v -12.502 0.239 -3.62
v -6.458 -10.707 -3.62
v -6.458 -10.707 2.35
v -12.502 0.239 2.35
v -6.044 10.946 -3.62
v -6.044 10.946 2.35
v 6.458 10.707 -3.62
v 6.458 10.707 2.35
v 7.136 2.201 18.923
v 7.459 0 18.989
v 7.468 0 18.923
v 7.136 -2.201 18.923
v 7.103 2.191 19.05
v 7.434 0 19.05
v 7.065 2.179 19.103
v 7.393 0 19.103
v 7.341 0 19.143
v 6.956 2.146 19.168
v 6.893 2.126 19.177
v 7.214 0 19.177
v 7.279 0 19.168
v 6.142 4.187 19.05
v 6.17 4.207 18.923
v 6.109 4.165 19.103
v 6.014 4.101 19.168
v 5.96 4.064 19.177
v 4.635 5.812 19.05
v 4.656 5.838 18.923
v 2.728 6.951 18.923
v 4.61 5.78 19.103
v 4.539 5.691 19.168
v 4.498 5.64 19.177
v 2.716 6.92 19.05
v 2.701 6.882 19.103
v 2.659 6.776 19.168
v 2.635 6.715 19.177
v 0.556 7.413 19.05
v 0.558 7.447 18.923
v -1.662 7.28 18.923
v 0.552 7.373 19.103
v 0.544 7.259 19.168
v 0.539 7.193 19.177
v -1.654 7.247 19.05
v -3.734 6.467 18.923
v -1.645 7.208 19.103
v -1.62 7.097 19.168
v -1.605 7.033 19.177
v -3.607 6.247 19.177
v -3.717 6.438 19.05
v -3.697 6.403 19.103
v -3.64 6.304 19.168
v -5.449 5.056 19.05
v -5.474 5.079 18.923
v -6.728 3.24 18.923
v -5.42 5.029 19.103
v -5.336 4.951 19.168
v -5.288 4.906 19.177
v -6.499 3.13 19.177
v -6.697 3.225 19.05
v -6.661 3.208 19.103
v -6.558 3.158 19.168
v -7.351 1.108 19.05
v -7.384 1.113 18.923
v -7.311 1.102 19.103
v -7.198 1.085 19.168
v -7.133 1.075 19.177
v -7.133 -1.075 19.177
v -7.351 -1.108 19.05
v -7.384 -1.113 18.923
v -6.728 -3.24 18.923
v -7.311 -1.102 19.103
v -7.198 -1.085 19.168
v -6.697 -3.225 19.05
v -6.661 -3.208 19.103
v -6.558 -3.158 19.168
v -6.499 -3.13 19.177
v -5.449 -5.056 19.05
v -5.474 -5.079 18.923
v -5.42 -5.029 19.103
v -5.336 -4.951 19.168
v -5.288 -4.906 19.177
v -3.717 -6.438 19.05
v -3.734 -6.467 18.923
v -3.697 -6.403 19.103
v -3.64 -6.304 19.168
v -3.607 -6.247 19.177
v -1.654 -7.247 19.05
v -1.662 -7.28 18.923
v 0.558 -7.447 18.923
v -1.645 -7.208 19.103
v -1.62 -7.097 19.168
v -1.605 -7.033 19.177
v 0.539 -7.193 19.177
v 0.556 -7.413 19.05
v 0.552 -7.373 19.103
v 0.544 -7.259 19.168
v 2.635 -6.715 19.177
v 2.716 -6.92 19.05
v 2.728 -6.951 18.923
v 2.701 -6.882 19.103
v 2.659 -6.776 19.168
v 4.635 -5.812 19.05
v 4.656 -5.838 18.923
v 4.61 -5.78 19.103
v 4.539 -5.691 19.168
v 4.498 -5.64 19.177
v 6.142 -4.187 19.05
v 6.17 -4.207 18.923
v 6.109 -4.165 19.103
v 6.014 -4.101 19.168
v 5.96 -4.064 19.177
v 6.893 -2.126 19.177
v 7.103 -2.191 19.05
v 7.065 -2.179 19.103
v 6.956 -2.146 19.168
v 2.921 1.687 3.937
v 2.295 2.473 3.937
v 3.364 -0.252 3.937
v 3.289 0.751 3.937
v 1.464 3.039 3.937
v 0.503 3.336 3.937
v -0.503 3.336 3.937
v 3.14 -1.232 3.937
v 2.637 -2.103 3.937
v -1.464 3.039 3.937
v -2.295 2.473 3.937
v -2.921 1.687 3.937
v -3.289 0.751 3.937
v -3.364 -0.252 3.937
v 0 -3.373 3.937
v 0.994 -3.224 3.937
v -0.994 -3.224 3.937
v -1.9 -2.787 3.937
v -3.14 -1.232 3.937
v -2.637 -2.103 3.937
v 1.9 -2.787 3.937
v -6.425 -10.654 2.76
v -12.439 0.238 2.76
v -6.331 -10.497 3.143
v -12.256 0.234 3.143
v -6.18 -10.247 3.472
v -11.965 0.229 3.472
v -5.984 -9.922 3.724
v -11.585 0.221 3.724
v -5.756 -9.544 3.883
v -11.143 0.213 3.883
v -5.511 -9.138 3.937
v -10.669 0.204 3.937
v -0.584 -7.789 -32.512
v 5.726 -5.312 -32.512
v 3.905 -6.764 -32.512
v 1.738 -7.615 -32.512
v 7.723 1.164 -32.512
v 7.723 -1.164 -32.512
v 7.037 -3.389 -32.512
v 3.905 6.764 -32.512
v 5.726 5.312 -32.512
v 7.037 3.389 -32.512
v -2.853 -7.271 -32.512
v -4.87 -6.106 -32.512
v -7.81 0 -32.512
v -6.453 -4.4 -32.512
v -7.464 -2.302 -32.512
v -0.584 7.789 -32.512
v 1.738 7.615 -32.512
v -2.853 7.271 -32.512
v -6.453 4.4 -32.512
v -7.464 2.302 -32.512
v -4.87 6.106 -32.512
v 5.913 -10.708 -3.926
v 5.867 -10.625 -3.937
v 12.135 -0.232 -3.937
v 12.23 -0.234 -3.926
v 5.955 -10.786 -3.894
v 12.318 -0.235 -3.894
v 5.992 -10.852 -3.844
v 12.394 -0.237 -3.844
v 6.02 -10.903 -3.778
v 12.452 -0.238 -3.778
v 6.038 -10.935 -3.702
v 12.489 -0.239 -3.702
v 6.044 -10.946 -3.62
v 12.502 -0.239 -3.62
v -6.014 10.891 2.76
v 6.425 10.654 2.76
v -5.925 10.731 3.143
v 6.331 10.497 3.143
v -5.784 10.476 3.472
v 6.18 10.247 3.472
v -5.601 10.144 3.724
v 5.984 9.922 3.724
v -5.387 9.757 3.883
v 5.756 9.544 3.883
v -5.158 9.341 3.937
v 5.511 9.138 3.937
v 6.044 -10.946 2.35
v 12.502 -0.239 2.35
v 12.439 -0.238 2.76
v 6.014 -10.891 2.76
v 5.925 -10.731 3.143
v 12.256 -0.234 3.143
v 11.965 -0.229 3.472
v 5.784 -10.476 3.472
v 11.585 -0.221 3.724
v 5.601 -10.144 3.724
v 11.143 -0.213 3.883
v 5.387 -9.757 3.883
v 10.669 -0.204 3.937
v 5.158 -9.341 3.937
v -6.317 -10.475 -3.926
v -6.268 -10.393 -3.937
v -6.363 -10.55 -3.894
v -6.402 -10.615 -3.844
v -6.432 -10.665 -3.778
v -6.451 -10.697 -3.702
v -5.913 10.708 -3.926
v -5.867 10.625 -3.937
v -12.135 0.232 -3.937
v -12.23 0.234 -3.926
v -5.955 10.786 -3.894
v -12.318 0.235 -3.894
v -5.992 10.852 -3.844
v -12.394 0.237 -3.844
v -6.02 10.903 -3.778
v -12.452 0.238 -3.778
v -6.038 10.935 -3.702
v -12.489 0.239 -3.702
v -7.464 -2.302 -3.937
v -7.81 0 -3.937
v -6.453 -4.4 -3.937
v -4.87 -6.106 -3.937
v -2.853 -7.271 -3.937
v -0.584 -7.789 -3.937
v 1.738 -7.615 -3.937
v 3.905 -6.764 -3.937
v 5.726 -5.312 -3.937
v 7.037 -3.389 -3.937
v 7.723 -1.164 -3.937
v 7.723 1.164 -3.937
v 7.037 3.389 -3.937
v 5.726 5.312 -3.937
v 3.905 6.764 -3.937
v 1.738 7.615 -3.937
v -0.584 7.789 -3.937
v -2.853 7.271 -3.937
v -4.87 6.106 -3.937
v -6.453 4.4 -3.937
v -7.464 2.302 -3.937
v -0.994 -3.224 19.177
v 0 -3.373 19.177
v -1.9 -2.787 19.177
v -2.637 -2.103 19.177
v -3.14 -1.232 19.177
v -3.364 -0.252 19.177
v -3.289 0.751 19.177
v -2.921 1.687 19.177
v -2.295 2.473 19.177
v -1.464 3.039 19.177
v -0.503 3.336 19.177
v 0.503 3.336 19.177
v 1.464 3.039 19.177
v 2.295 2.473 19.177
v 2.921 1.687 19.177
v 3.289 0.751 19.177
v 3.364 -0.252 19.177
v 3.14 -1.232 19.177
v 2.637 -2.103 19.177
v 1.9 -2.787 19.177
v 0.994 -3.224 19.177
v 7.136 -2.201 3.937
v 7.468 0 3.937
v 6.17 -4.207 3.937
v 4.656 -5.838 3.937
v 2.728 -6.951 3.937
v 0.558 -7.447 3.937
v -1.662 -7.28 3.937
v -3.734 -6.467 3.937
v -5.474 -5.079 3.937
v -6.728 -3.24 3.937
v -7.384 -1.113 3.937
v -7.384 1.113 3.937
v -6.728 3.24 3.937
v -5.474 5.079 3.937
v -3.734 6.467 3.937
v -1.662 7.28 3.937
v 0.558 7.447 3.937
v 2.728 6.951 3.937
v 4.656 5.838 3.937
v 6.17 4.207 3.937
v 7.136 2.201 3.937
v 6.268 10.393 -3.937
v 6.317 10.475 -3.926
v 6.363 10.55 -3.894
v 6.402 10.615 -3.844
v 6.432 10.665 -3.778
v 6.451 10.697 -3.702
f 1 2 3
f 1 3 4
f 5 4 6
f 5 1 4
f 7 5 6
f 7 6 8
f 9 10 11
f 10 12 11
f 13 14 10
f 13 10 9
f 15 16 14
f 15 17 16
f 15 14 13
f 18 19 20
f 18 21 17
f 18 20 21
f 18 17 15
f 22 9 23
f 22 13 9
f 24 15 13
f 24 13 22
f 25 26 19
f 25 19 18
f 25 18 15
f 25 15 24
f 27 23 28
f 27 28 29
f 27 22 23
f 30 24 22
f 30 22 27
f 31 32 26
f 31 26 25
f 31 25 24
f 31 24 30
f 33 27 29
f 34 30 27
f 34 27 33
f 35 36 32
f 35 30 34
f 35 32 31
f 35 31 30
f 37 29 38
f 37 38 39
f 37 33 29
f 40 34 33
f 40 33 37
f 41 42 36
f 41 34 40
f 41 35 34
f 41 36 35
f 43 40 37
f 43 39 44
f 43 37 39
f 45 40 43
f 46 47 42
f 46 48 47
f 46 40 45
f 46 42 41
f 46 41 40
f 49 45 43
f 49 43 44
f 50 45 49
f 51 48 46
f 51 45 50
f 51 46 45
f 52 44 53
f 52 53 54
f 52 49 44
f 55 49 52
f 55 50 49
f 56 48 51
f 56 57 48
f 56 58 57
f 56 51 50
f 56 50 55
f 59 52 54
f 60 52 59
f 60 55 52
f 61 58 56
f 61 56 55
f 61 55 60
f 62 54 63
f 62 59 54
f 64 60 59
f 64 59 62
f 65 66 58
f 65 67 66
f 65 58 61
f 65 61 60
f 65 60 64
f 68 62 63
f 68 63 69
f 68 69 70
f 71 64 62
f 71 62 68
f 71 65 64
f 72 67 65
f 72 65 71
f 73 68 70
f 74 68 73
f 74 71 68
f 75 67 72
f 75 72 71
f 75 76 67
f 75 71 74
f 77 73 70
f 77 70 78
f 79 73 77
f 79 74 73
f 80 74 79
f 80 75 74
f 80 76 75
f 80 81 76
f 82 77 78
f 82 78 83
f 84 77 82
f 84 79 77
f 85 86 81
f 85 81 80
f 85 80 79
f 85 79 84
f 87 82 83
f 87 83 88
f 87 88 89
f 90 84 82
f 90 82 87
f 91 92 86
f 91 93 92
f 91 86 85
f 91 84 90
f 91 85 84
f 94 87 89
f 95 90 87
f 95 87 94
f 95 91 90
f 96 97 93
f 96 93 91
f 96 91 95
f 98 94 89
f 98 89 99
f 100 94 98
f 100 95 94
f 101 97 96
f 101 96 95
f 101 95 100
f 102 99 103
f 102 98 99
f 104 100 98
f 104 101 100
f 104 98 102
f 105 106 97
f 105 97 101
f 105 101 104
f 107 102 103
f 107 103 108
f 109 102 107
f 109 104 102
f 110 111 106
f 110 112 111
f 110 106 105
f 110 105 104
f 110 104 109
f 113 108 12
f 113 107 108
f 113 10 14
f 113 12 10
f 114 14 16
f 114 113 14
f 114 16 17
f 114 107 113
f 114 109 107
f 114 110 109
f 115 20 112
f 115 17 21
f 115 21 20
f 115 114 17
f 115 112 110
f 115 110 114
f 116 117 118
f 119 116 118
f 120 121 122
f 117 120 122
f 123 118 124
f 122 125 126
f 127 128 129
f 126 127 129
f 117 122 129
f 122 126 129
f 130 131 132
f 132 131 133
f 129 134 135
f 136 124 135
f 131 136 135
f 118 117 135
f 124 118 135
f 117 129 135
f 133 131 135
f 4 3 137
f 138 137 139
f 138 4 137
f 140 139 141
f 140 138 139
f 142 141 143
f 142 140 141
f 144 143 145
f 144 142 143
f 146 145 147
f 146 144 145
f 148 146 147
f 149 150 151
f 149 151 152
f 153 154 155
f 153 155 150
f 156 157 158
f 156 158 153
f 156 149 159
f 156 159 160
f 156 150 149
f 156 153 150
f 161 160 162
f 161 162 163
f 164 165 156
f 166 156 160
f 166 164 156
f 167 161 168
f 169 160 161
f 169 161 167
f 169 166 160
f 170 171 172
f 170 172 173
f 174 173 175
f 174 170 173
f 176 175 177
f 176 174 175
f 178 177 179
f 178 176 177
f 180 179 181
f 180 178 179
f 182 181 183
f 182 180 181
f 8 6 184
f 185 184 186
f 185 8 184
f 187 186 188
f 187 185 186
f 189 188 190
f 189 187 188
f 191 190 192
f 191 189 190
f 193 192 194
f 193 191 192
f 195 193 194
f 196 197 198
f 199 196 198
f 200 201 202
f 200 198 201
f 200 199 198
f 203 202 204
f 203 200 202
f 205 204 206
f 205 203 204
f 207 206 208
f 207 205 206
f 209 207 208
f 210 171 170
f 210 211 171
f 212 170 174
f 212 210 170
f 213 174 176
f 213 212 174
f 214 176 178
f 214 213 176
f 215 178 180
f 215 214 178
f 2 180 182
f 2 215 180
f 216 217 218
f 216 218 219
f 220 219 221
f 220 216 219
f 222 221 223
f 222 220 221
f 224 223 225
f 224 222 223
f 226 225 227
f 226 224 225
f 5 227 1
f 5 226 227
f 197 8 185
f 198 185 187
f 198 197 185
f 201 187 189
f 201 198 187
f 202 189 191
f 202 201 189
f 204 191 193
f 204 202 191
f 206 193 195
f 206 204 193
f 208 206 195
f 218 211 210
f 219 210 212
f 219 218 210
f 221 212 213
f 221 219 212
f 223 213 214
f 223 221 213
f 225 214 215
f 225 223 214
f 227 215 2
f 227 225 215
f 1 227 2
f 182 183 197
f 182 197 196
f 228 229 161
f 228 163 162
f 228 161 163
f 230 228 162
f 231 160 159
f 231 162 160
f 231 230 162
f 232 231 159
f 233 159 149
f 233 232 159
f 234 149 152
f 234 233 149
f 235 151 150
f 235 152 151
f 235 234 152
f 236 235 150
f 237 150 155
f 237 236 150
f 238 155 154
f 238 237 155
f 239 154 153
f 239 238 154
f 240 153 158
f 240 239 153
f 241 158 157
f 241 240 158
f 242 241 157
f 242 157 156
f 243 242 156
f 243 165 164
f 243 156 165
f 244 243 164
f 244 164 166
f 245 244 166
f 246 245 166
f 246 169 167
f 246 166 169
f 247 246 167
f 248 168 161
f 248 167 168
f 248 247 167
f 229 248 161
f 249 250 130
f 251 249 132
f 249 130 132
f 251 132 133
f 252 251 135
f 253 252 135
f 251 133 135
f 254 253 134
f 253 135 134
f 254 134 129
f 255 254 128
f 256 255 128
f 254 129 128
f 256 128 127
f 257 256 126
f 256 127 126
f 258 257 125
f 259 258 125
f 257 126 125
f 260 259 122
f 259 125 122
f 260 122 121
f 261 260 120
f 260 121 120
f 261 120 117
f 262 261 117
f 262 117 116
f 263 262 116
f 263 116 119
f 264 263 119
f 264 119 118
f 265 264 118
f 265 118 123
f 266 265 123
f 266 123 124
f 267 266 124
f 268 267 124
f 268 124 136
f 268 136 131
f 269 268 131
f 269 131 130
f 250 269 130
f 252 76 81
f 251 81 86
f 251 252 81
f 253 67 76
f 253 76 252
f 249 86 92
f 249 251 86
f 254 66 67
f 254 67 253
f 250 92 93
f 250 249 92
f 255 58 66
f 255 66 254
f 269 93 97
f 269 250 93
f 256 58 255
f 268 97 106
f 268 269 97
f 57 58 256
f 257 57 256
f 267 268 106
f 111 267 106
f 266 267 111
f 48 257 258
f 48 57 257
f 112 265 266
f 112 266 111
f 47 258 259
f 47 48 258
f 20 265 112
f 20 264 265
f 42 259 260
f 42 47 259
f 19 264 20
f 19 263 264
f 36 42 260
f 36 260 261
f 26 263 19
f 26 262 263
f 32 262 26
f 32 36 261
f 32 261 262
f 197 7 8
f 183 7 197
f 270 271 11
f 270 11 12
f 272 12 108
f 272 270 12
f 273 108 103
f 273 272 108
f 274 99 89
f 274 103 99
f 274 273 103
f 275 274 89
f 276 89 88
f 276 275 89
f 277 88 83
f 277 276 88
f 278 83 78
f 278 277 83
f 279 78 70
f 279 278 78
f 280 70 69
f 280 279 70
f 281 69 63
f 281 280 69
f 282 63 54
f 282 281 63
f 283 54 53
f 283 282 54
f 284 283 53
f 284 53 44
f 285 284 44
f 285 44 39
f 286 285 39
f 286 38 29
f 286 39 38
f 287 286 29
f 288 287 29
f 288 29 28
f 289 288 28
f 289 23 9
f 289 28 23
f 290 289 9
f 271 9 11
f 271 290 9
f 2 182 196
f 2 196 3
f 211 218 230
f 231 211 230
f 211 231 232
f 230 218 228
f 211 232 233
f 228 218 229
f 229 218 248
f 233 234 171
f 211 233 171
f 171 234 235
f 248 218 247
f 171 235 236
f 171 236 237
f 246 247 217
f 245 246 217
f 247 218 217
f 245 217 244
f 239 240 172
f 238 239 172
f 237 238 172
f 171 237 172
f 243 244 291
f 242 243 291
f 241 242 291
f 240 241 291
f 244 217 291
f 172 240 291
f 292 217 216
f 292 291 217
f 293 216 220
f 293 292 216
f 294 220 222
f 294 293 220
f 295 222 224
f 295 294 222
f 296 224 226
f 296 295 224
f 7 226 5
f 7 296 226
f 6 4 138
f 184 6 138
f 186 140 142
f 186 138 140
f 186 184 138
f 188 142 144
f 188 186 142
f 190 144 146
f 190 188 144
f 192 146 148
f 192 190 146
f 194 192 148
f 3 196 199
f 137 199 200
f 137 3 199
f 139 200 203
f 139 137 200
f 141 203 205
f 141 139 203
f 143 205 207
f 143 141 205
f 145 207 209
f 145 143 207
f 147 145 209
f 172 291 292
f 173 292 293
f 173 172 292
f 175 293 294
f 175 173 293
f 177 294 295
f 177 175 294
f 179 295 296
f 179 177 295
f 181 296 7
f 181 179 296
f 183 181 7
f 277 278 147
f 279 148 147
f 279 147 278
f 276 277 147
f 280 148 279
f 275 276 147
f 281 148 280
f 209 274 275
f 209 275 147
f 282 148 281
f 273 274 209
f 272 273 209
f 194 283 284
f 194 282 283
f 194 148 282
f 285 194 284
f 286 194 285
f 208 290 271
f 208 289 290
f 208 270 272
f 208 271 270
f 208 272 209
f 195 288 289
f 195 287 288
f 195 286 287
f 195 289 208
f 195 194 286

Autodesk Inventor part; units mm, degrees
ref_plane "YZ Plane" through (0, 0, 0) normal (1, 0, 0) x (0, 1, 0)
ref_plane "XZ Plane" through (0, 0, 0) normal (0, 1, 0) x (-1, 0, 0)
ref_plane "XY Plane" through (0, 0, 0) normal (0, 0, 1) x (1, 0, 0)
sketch "Sketch1" plane through (0, 0, 0) normal (0, 0, 1) x (1, 0, 0)
  line L0 (6.4577, 10.7072) -> (12.5016, -0.2389)
  line L1 (12.5016, -0.2389) -> (6.0439, -10.9461)
  line L2 (6.0439, -10.9461) -> (-6.4577, -10.7072)
  line L3 (-6.4577, -10.7072) -> (-12.5016, 0.2389)
  line L4 (-12.5016, 0.2389) -> (-6.0439, 10.9461)
  line L5 (-6.0439, 10.9461) -> (6.4577, 10.7072)
  point P0 (0, 0)
  point P1 (0, 0)
  dimension "d0" = 25.0031
extrude "Extrusion1" add sketch "Sketch1" along normal mid plane 7.874
sketch "Sketch2" plane through (0, 0, 3.937) normal (0, 0, 1) x (1, 0, 0)
  circle A0 centre (0, 0) radius 7.4676
  dimension "d3" = 14.9352
extrude "Extrusion2" add sketch "Sketch2" along normal blind 15.24
fillet "Fillet1" radius 0.254 1 edges at (-7.4676, 0, 19.177)
sketch "Sketch3" plane through (0, 0, 19.177) normal (0, 0, 1) x (1, 0, 0)
  point P0 (0, 0)
  point P1 (0, 0)
hole "Hole1" at (0, 0, 19.177) at (0, 0, 19.177) direction (0, 0, -1) diameter 6.7469 depth 15.24
sketch "Sketch4" plane through (0, 0, -3.937) normal (0, 0, -1) x (-1, 0, 0)
  circle A0 centre (0, 0) radius 7.8105
  dimension "d15" = 15.621
extrude "Extrusion3" add sketch "Sketch4" along normal blind 28.575
thread "Thread1" size "5/8-11 UNC" class "2A" standard "ANSI Unified Screw Threads" length 19.05
thread "Thread2" size "10-24 UNC" class "2B" standard "ANSI Unified Screw Threads" length 25.4
fillet "Fillet2" radius 1.5875 6 edges at (9.4796, 5.2342, 3.937) (0.2069, 10.8267, 3.937) (9.2727, -5.5925, 3.937) (-0.2069, -10.8267, 3.937) (-9.4796, -5.2342, 3.937) (-9.2727, 5.5925, 3.937)
fillet "Fillet3" radius 0.3175 6 edges at (-0.2069, -10.8267, -3.937) (9.2727, -5.5925, -3.937) (9.4796, 5.2342, -3.937) (0.2069, 10.8267, -3.937) (-9.2727, 5.5925, -3.937) (-9.4796, -5.2342, -3.937)
properties part number "Double Sided Bolt" material "Stainless Steel"
